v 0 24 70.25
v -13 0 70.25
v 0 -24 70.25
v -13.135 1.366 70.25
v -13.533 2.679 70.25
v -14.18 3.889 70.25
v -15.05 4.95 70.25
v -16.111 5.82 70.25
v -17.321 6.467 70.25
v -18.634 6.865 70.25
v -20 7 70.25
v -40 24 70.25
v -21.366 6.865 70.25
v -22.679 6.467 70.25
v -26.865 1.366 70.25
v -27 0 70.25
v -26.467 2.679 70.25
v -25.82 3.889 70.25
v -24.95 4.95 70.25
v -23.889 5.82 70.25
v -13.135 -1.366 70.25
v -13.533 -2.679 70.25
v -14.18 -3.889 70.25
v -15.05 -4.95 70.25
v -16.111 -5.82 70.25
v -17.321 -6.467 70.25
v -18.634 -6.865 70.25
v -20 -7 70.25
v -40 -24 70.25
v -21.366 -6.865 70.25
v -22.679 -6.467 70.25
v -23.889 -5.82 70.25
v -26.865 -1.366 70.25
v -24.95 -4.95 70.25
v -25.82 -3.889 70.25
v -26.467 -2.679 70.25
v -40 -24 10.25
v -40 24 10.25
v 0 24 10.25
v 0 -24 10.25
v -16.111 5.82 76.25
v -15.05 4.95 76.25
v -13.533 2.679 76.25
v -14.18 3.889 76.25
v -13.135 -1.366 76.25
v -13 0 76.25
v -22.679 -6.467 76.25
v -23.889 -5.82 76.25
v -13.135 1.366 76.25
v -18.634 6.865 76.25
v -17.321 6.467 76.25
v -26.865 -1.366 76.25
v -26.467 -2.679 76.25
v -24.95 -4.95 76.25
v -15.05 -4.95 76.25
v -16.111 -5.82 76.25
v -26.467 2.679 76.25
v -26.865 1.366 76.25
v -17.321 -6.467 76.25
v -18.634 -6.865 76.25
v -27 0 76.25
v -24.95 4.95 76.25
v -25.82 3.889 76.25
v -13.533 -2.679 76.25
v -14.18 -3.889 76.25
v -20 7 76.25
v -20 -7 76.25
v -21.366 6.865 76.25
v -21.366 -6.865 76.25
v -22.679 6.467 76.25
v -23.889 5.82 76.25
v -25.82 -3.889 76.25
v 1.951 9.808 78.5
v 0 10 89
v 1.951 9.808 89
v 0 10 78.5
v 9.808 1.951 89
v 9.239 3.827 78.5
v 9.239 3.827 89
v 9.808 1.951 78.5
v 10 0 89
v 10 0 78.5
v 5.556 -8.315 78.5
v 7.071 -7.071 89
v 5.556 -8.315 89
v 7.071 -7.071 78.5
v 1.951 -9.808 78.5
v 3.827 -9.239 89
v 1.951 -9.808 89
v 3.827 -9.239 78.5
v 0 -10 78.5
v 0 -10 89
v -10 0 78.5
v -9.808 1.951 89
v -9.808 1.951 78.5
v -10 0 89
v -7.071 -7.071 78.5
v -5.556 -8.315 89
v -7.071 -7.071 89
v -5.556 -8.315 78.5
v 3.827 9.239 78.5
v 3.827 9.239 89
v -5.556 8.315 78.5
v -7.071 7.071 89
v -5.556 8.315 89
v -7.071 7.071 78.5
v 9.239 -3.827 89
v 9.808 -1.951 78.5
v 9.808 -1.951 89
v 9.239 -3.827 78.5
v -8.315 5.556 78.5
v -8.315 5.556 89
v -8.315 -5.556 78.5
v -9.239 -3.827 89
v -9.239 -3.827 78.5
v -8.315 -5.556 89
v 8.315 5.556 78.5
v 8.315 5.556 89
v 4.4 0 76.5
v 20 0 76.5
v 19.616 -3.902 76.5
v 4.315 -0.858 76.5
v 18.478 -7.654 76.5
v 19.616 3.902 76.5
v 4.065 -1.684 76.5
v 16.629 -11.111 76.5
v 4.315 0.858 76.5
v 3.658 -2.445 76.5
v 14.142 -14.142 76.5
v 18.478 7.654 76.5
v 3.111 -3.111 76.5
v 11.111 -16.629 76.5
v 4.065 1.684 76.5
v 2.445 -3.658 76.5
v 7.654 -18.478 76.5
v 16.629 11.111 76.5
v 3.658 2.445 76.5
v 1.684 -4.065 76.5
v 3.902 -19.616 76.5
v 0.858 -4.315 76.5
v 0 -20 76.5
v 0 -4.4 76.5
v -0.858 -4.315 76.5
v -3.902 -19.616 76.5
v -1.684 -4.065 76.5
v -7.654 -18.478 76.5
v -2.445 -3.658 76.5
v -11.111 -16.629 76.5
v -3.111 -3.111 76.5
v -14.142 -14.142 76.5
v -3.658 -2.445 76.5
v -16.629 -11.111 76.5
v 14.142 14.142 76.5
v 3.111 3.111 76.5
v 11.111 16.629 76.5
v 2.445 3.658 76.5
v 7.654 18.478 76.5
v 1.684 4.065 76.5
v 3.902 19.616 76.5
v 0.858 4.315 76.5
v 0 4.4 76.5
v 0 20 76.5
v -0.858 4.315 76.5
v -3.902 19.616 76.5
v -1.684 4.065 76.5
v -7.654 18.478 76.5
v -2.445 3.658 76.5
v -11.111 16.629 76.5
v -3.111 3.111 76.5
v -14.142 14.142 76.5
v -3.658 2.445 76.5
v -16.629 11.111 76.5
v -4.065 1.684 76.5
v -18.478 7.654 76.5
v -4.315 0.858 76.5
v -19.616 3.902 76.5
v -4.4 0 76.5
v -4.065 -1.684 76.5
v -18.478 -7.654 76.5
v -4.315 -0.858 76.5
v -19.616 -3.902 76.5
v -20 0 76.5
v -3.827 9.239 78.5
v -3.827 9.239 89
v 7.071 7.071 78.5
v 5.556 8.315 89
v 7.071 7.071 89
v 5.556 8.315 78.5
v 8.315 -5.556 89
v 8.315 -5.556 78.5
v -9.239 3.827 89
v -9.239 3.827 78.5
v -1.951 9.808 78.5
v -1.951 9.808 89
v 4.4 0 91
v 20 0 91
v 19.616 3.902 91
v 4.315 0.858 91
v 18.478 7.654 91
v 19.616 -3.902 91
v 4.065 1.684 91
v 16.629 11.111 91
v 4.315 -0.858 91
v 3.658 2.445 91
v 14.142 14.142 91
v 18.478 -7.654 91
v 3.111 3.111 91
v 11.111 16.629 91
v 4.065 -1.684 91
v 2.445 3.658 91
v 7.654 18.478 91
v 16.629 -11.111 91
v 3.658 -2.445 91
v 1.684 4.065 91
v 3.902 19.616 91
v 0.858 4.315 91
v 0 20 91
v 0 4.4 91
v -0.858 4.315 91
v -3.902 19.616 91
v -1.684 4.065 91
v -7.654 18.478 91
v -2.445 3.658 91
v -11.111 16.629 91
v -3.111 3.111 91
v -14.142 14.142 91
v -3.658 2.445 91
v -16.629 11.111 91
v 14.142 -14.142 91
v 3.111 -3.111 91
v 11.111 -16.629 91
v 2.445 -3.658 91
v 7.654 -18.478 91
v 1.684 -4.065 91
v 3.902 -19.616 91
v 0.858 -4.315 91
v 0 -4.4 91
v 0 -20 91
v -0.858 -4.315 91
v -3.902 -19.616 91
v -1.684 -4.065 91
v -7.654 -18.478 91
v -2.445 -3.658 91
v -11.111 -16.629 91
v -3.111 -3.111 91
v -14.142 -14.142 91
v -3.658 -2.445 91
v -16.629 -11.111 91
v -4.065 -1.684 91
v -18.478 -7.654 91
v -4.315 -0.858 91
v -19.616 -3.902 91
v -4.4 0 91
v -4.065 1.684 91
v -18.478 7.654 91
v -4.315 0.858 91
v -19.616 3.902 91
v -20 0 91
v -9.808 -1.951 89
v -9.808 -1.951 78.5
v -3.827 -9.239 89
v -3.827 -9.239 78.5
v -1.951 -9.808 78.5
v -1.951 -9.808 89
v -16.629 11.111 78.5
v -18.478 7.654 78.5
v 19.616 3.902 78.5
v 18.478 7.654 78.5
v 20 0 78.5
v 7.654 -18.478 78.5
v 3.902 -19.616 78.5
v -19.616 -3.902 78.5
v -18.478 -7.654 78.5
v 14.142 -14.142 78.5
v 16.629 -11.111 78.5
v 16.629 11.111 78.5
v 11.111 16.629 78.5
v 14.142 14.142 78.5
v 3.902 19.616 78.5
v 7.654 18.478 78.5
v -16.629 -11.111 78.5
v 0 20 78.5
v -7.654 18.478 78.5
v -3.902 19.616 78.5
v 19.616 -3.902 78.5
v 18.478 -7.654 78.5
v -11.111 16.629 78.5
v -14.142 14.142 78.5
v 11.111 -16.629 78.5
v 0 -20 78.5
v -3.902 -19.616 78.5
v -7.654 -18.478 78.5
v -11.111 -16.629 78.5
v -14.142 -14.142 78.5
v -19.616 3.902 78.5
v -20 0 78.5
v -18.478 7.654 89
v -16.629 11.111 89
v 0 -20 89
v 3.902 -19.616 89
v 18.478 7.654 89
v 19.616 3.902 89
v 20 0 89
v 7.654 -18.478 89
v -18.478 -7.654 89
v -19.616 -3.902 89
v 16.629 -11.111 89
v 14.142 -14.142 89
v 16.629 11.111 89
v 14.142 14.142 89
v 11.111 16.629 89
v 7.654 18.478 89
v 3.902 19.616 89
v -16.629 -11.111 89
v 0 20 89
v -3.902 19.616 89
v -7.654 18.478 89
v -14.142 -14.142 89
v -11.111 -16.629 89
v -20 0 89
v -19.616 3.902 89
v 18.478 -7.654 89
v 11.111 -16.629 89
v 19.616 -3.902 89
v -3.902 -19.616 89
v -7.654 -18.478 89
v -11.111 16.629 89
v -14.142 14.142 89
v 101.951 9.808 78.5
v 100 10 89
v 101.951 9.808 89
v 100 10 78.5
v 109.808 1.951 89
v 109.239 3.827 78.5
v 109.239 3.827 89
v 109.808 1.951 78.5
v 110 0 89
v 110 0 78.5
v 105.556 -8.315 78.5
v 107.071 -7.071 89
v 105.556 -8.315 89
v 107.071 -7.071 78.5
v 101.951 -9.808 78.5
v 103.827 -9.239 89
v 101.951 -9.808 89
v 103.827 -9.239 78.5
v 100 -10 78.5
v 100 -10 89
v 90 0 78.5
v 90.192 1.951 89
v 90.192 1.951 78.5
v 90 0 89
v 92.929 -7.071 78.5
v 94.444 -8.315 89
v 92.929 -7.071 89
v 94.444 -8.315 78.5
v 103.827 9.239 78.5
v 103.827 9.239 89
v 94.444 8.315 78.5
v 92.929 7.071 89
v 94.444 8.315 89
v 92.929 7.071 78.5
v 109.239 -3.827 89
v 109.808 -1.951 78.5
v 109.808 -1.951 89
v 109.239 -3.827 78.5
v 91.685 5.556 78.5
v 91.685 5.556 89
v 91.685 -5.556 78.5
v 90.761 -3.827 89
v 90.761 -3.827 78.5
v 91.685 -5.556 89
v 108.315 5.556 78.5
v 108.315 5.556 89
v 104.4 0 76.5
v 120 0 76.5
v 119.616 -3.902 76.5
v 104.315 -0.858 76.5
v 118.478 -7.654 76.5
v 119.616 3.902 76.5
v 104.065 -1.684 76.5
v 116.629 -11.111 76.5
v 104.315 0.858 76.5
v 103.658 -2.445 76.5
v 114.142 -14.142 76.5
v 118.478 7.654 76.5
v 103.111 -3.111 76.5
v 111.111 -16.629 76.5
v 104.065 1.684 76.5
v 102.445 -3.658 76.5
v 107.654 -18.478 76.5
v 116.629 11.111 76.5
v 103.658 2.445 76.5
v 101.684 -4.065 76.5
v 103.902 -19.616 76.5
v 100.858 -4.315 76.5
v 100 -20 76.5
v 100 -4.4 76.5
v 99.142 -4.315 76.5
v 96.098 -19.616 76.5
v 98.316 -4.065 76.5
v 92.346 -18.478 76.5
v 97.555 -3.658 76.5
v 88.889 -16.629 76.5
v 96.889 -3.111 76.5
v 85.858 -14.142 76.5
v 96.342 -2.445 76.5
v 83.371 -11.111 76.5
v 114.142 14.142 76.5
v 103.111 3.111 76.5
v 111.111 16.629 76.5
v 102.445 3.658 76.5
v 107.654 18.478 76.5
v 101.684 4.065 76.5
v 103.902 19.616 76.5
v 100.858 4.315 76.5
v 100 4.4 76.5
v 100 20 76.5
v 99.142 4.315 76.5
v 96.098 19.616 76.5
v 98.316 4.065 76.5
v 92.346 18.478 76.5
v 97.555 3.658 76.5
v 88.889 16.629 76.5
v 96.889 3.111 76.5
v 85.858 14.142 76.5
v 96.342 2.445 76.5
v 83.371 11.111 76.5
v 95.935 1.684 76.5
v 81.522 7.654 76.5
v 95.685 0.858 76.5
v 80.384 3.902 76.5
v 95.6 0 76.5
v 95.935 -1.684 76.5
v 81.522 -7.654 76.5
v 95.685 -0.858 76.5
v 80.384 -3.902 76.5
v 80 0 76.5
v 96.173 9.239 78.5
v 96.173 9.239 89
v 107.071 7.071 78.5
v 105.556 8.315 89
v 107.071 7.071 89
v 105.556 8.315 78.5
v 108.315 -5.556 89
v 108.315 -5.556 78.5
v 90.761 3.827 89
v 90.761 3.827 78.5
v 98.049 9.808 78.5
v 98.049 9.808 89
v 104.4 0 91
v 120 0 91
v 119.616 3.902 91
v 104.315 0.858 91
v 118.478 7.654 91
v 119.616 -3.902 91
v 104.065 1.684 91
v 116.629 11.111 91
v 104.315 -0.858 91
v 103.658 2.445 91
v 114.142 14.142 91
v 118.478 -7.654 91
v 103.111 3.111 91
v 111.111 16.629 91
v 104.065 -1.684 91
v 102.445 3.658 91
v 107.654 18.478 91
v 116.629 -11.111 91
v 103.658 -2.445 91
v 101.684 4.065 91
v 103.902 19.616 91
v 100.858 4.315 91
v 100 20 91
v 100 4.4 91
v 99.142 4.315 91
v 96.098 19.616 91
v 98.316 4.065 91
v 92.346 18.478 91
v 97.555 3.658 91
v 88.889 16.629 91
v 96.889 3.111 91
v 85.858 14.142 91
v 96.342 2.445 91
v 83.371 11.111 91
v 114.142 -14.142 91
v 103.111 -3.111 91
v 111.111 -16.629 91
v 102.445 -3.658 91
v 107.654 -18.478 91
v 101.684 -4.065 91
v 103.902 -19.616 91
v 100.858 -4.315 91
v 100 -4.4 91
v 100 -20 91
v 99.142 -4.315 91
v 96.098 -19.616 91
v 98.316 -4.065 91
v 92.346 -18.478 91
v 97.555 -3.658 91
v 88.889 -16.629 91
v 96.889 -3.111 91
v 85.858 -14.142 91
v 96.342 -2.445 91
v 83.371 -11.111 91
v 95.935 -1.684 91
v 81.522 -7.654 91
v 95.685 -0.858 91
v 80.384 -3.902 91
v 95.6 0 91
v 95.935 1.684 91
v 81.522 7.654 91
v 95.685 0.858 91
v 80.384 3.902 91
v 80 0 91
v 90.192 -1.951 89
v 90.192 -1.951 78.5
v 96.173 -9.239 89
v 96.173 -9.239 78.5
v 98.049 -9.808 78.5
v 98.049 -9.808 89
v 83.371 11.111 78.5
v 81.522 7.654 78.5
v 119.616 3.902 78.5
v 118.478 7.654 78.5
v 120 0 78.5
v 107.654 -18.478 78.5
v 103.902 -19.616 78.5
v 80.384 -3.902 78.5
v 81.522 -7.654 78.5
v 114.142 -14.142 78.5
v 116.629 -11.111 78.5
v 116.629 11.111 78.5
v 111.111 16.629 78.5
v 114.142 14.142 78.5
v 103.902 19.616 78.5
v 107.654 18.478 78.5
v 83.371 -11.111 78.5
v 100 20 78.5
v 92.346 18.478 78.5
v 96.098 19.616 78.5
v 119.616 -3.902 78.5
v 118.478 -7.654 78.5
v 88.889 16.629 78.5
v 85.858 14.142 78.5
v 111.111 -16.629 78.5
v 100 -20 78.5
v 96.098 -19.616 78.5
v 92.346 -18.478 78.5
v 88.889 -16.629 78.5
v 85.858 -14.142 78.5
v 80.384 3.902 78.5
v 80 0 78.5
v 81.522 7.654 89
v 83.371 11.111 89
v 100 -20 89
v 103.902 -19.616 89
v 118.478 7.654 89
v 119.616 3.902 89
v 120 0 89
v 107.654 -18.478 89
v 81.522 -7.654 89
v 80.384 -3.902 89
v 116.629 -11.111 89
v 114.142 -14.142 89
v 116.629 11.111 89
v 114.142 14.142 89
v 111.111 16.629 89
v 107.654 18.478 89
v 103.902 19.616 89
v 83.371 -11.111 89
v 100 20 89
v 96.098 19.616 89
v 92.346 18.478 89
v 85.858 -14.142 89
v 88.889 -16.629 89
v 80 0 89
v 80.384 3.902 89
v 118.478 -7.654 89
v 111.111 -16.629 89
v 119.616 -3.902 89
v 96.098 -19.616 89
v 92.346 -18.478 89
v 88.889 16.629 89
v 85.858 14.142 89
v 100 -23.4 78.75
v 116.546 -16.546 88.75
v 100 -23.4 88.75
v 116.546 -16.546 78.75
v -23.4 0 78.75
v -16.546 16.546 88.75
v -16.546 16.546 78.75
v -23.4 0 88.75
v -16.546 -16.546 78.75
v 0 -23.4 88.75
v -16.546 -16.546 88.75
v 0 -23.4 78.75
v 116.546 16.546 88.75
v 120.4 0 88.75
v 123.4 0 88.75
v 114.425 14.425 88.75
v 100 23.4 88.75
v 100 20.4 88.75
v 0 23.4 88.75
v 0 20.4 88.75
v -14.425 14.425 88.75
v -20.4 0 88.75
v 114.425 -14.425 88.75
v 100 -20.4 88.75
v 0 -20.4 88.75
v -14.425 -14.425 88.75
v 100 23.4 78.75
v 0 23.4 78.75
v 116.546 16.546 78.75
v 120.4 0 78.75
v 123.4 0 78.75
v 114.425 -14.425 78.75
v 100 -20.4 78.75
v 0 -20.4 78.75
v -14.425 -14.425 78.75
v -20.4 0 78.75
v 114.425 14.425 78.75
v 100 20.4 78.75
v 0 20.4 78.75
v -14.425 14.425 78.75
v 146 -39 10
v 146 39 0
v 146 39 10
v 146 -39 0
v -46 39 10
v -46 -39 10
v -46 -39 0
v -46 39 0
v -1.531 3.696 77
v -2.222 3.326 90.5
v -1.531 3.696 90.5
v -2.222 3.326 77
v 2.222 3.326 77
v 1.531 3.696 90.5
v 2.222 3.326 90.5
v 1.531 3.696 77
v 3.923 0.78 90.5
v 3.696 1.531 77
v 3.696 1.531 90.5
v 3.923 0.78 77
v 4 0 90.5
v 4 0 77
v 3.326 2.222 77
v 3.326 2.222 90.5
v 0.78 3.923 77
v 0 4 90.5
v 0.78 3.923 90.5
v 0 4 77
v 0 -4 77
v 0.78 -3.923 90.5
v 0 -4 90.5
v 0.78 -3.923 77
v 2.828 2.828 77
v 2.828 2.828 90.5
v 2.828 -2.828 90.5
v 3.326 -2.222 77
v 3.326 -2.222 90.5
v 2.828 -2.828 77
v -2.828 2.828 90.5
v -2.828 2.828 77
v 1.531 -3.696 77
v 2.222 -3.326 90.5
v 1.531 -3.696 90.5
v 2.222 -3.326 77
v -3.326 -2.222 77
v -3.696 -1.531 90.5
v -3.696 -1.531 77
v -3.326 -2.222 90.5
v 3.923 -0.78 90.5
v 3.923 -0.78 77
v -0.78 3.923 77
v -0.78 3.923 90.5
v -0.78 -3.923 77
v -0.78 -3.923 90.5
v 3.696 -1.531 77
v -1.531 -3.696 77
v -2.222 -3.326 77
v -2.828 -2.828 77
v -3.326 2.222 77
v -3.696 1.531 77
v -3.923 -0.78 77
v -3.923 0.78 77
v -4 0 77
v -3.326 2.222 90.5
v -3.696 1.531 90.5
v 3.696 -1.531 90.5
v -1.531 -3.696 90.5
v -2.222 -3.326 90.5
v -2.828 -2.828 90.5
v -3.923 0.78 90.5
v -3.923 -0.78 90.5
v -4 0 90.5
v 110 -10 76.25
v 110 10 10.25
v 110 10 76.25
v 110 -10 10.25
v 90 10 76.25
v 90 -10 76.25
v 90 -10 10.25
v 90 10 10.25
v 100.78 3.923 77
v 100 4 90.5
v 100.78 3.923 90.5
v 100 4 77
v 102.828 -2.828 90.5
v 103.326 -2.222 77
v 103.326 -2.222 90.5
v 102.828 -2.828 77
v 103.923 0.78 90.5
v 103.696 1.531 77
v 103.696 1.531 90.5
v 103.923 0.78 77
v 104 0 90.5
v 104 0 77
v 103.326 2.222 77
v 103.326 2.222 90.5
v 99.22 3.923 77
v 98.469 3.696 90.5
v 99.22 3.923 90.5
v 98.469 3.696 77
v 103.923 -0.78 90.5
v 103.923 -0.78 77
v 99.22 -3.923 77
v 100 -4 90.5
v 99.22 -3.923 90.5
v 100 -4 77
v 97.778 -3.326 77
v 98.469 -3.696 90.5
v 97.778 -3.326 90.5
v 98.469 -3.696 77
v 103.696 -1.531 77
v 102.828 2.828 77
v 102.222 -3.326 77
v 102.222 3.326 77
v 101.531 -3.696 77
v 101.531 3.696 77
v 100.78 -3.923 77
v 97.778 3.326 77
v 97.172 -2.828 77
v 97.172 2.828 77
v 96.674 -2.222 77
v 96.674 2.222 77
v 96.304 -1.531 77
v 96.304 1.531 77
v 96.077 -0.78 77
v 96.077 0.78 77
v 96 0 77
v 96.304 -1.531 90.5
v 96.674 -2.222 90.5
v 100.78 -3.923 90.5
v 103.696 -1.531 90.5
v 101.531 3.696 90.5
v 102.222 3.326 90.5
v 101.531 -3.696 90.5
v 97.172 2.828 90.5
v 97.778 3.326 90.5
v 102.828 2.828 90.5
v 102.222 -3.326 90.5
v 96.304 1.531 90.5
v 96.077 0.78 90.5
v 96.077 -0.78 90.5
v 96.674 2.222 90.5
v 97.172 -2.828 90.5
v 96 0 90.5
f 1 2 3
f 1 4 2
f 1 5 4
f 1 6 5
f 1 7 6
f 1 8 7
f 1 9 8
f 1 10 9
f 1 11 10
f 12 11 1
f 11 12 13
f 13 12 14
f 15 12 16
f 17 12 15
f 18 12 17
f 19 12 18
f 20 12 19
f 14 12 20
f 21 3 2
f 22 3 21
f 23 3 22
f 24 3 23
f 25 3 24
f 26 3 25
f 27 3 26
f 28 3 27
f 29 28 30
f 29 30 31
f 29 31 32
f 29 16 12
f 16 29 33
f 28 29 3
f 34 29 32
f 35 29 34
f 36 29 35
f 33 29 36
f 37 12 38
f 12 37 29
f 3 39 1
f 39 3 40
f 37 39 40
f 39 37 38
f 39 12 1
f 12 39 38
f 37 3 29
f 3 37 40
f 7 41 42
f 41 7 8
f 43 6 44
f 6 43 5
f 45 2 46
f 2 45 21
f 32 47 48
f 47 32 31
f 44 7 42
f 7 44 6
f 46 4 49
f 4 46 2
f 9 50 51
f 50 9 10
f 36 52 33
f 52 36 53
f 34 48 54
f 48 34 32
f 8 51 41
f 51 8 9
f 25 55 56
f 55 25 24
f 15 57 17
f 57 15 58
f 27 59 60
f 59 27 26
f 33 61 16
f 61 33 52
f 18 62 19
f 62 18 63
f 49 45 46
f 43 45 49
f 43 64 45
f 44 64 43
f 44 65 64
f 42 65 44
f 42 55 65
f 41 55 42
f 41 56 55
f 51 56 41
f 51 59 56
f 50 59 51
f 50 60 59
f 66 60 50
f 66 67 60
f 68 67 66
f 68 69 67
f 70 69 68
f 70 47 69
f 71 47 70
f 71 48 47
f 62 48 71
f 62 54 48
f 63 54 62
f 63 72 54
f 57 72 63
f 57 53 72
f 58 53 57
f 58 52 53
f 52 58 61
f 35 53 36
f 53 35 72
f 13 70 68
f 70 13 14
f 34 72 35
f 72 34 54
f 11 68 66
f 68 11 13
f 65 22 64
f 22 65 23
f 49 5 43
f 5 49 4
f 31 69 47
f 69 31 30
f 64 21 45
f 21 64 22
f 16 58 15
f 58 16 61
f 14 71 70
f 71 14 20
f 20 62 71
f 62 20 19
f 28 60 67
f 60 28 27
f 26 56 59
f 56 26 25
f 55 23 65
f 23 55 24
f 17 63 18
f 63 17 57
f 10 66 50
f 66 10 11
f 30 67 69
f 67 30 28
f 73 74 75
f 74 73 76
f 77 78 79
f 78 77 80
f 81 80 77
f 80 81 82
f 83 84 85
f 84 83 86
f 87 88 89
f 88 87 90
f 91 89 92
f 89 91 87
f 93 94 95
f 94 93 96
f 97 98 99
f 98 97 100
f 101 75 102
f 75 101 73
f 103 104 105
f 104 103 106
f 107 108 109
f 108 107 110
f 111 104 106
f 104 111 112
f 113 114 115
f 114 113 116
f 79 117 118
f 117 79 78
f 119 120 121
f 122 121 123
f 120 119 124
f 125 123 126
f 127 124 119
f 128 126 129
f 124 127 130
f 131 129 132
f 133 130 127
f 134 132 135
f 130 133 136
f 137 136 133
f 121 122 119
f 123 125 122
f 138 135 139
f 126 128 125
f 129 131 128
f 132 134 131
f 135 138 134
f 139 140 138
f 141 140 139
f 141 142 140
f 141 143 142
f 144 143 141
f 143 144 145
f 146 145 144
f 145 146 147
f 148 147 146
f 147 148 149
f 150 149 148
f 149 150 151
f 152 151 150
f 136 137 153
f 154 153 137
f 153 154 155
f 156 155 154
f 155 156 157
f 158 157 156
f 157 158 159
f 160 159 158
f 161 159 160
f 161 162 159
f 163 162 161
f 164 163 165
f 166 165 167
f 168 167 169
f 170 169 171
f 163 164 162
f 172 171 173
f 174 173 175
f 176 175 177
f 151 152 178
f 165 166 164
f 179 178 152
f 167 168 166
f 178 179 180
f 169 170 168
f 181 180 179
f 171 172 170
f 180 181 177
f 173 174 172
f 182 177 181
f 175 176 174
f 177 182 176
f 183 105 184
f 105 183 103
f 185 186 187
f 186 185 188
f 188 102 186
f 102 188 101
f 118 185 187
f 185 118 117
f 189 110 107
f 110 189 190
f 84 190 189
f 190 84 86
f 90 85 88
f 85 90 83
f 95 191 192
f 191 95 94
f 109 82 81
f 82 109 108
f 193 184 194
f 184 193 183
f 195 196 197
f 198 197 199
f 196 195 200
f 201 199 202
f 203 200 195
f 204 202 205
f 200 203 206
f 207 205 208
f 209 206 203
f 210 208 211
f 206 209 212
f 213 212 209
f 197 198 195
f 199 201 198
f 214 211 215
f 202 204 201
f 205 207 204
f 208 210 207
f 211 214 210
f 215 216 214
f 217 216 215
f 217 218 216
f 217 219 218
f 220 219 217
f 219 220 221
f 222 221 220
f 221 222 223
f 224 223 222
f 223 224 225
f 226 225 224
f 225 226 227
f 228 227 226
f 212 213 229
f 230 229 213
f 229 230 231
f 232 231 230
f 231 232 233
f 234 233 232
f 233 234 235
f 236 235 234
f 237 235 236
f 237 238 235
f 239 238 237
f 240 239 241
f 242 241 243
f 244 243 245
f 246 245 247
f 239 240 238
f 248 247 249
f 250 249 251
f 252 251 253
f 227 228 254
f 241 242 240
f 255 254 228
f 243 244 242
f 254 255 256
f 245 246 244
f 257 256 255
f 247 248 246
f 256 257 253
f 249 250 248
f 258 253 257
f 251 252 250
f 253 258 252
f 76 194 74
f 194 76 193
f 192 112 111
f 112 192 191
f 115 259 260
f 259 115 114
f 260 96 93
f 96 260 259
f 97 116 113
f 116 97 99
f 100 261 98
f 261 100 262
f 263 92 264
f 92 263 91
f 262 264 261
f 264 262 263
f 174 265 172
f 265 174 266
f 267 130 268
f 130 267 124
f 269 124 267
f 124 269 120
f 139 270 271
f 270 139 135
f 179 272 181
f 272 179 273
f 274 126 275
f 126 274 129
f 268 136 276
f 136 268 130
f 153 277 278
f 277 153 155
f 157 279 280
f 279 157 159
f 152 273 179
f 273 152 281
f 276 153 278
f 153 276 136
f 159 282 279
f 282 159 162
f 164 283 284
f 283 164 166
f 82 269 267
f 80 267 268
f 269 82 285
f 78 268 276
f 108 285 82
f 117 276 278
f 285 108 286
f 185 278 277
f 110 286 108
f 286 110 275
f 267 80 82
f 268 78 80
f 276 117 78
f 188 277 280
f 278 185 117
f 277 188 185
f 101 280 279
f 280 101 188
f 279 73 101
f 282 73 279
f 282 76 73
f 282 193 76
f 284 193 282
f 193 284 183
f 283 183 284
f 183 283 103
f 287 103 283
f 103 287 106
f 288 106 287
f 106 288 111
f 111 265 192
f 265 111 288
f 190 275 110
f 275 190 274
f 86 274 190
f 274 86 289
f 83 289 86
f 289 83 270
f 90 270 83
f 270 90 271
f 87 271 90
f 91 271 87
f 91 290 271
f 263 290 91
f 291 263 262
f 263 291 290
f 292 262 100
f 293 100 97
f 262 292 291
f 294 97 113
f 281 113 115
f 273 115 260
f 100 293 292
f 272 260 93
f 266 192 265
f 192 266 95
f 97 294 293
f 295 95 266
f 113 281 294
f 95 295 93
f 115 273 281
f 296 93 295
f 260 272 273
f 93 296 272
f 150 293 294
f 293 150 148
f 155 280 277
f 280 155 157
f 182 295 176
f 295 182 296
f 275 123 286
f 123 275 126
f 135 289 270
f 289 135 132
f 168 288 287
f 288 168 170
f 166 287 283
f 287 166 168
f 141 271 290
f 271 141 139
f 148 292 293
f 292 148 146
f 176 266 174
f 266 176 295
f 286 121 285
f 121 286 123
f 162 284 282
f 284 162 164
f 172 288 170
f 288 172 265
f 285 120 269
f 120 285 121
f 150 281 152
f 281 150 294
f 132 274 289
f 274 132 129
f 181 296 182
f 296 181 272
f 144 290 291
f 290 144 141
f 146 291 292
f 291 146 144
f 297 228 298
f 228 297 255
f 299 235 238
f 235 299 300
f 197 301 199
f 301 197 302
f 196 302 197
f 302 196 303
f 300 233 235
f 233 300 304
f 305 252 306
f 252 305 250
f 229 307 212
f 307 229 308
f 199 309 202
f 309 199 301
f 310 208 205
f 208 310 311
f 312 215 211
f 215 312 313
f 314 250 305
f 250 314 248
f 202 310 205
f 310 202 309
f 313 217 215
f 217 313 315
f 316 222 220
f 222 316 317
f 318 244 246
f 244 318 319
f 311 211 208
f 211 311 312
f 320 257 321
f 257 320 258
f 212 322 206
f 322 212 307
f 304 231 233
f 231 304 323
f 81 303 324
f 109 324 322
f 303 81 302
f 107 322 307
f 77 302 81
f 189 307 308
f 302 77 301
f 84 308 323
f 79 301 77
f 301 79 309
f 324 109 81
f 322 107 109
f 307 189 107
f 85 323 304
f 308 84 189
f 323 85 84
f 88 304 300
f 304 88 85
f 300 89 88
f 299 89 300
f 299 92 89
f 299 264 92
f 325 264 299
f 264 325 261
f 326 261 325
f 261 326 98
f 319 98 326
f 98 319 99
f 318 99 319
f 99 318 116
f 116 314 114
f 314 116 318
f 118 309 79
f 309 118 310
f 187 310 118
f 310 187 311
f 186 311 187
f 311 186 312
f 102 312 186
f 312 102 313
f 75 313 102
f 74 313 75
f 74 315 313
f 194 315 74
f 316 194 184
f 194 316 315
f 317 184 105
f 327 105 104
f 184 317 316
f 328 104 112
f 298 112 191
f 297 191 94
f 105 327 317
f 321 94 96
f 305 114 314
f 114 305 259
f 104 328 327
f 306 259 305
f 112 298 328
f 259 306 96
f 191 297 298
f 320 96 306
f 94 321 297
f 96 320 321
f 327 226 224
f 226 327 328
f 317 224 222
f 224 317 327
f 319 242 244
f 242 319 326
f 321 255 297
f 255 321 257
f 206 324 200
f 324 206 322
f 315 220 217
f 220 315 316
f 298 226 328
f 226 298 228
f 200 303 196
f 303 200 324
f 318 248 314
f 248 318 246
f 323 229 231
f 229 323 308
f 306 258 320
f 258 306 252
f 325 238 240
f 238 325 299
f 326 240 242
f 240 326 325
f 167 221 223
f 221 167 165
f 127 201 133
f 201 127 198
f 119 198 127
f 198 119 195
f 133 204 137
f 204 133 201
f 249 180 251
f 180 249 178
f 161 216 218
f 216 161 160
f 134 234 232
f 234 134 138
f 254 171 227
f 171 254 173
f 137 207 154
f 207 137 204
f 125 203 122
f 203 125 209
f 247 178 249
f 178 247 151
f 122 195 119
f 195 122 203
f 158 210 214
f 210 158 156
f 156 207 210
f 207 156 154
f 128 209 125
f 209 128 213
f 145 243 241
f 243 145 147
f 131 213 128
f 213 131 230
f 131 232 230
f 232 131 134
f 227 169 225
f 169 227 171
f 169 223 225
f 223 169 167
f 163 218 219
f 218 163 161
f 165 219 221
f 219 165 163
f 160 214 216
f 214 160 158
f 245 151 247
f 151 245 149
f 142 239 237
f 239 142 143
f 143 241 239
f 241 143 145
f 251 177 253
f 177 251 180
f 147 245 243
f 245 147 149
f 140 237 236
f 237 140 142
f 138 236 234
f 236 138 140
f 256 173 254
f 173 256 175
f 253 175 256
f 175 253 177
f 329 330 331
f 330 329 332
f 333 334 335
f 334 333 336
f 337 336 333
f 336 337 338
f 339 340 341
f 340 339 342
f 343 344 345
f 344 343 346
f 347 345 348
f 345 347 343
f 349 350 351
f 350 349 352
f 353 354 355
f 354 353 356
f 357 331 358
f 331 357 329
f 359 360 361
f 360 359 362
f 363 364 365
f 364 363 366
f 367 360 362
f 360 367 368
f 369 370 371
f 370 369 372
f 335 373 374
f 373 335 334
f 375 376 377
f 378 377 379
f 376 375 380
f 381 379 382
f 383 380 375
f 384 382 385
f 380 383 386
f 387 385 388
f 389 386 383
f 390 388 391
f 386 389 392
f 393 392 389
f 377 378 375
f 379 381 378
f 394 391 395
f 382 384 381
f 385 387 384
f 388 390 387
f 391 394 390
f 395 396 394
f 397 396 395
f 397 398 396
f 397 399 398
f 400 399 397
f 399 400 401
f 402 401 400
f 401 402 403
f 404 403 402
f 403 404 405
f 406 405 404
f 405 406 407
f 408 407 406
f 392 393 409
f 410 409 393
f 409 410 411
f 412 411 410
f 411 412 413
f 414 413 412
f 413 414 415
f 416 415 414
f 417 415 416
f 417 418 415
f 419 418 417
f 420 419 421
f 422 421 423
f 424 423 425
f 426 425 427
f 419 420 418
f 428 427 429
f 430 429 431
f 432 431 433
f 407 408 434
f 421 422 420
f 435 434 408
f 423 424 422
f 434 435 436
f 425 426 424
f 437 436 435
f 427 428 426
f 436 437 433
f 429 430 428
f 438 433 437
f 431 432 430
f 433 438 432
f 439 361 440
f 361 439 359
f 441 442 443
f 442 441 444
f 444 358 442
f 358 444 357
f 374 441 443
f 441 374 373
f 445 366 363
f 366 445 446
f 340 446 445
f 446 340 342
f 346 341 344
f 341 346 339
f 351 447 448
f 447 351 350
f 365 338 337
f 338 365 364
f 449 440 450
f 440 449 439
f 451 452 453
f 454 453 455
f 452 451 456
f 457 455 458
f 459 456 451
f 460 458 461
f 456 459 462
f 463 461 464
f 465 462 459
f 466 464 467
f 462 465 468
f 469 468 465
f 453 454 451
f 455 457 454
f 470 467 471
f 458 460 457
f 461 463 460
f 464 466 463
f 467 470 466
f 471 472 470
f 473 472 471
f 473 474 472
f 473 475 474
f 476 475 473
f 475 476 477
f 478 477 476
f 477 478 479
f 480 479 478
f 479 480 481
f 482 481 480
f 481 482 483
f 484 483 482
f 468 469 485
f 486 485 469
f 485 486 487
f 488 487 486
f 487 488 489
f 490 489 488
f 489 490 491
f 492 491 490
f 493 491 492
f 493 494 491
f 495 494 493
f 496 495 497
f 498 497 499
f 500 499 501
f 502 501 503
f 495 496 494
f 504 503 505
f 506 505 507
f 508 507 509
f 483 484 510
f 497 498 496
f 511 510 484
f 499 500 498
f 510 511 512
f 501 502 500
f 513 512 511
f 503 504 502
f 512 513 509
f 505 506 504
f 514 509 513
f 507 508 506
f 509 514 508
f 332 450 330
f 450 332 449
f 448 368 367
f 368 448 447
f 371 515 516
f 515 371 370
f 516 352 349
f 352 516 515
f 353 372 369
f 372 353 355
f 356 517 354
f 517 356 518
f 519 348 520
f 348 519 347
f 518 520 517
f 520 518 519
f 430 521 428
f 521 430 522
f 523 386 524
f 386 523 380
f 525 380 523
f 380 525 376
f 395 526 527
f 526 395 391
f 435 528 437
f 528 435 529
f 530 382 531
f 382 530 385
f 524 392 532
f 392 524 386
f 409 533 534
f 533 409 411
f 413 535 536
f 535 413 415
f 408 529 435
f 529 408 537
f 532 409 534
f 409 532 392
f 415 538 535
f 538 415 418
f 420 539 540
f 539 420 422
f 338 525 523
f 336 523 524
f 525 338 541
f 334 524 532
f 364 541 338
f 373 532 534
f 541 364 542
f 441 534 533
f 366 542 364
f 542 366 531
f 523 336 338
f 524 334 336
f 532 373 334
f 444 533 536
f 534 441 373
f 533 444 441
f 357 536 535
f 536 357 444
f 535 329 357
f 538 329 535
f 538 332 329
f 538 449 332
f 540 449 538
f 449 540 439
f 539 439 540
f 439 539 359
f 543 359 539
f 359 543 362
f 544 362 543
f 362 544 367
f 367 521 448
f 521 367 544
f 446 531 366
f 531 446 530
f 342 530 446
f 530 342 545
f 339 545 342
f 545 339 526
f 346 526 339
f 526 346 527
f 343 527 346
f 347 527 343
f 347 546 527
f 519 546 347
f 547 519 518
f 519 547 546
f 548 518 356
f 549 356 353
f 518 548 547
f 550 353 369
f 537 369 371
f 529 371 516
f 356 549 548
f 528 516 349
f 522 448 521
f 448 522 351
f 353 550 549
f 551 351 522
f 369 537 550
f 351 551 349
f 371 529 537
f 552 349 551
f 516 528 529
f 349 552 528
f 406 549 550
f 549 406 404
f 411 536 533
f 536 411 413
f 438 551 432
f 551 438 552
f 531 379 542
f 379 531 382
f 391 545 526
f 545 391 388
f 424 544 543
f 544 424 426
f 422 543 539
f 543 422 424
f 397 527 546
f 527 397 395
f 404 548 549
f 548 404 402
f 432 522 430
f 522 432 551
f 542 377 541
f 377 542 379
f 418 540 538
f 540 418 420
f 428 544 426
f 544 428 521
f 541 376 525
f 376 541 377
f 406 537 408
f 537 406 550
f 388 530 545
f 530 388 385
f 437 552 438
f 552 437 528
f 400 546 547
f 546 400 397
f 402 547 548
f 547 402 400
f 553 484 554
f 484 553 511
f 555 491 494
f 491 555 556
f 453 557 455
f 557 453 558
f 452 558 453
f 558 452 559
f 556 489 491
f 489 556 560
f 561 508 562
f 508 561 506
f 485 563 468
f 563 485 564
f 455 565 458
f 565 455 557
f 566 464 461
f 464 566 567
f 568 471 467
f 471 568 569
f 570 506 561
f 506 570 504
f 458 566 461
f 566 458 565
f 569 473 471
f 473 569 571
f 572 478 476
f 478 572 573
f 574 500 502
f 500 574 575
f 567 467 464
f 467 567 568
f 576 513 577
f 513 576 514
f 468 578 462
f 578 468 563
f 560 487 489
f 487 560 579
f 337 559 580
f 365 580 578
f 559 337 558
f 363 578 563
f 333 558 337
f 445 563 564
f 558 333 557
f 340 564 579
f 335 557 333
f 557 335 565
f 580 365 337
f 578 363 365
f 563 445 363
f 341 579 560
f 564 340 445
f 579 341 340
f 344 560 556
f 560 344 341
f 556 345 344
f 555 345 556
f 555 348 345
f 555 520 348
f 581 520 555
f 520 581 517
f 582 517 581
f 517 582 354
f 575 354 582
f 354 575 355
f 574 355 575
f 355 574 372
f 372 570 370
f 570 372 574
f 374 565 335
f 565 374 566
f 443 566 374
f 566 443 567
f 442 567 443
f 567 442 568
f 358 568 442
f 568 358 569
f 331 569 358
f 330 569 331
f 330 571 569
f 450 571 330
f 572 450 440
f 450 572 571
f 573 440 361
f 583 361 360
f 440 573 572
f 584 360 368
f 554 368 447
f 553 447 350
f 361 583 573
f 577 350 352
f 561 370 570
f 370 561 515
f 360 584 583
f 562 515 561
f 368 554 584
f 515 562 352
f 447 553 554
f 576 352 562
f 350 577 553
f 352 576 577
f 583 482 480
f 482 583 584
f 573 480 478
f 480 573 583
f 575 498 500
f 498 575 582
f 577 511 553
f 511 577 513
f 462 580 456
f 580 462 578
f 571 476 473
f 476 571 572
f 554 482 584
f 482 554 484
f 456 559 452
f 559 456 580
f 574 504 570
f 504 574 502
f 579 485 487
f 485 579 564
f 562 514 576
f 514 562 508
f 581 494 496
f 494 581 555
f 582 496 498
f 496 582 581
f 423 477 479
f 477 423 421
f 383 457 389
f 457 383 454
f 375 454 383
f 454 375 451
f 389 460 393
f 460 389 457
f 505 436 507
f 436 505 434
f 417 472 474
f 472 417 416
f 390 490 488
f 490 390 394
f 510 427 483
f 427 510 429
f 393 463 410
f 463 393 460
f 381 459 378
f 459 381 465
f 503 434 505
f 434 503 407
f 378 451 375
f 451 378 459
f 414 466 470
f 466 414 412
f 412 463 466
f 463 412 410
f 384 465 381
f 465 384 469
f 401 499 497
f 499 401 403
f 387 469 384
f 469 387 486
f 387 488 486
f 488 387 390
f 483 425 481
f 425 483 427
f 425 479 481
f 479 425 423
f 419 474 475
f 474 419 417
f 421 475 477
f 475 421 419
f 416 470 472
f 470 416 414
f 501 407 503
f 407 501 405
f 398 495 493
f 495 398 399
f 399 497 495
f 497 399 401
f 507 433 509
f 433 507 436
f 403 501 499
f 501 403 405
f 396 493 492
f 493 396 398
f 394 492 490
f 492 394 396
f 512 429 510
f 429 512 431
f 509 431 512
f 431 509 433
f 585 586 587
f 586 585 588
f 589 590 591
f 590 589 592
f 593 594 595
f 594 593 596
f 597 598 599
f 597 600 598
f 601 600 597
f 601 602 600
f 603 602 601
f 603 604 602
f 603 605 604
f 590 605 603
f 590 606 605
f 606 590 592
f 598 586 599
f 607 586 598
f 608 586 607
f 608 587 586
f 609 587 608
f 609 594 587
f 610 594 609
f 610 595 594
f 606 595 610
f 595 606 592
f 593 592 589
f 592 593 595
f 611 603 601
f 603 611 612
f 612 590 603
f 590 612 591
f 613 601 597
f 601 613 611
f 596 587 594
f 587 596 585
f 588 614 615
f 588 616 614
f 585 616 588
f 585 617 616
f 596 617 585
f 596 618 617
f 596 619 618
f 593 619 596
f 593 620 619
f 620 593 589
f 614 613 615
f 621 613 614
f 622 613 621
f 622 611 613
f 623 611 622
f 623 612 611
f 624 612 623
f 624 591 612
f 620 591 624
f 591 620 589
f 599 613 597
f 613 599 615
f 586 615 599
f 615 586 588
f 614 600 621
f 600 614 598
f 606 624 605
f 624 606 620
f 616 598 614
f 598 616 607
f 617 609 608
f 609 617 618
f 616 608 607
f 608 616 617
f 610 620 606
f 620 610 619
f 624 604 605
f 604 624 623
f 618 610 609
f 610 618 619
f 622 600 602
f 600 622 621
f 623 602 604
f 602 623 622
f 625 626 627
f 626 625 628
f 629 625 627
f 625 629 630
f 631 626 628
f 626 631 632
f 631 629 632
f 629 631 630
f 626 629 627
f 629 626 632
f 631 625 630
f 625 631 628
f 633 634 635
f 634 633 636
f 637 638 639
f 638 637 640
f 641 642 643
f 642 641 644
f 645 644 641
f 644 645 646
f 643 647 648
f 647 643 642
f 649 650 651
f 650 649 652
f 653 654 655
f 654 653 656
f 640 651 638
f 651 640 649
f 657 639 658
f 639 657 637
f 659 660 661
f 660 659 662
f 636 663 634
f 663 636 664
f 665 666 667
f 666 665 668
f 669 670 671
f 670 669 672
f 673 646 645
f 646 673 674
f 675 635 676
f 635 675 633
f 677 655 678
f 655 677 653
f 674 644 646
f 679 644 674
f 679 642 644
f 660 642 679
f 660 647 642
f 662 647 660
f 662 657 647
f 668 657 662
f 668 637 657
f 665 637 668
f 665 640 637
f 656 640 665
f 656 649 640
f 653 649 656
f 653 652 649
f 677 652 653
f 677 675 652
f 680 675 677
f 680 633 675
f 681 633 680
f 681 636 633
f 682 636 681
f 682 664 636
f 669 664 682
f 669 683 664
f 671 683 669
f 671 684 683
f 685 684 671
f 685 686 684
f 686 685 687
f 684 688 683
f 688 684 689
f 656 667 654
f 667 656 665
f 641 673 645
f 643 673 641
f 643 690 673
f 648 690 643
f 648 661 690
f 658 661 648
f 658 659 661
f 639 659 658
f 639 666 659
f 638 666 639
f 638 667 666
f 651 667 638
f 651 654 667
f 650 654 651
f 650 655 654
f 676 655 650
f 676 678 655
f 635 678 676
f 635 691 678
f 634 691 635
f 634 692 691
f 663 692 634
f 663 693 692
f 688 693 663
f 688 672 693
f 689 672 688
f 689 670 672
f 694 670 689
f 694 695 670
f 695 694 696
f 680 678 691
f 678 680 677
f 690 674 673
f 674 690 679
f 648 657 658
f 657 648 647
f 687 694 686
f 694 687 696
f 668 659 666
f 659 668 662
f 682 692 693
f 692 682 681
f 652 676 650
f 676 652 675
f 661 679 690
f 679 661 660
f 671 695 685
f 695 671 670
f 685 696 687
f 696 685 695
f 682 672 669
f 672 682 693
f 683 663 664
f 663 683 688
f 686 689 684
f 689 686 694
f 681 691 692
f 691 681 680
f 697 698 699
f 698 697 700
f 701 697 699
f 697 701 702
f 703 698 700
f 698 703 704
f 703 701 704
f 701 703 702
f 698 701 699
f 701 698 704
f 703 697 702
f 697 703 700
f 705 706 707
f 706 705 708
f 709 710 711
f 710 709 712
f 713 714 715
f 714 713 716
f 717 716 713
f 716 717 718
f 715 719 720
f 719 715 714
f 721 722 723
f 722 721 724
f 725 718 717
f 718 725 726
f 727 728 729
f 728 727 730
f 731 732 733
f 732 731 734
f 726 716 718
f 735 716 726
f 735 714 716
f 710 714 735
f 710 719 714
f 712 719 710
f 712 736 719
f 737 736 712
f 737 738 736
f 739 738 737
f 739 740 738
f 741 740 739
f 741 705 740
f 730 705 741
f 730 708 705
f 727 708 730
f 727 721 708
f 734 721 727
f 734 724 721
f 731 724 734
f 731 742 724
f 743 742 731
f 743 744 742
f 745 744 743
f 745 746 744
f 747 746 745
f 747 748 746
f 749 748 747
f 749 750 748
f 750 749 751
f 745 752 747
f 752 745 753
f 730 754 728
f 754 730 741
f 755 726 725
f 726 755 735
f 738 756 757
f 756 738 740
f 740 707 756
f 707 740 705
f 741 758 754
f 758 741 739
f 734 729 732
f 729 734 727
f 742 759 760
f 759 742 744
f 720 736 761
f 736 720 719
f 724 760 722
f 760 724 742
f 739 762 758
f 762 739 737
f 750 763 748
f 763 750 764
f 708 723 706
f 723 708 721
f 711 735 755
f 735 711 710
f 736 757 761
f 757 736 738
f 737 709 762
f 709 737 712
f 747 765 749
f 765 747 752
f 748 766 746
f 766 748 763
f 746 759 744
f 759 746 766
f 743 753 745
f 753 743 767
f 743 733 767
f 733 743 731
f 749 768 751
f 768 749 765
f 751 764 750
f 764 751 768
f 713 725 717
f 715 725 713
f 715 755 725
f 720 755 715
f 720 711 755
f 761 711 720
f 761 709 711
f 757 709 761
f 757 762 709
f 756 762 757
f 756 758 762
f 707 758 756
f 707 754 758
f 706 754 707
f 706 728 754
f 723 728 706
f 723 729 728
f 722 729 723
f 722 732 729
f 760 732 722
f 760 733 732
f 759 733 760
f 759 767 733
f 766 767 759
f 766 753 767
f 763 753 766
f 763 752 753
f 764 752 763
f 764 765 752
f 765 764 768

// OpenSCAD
$fn = 32;

// ------------------------------------------------------------------------
// Motor belt drive: span 100 mm, pulleys d40, belt 10 mm wide
// Every part is its own module, assembly() places every instance.
// ------------------------------------------------------------------------

// --- part 1 ---
module base_plate() {
  difference() {
    translate([-96, -39, 0]) cube([192, 78, 10]);
  }
}

// --- part 2 ---
module motor() {
  union() {
    translate([-30, -24, 0]) cube([60, 48, 40]);
    translate([33, 0, 20]) rotate([0, 90, 0]) cylinder(h = 6, d = 14, center = true);
  }
}

// --- part 3 ---
module drive_shaft() {
  translate([0, 0, -6.75]) cylinder(h = 13.5, d = 8);
}

// --- part 4 ---
module pulley_drive() {
  difference() {
    union() {
      cylinder(h = 14.5, d = 20);
      cylinder(h = 2, d = 40);
      translate([0, 0, 12.5]) cylinder(h = 2, d = 40);
    }
    translate([0, 0, -1]) cylinder(h = 16.5, d = 8.8);
  }
}

// --- part 5 ---
module idler_post() {
  translate([-10, -10, 0]) cube([20, 20, 66]);
}

// --- part 6 ---
module driven_shaft() {
  translate([0, 0, -6.75]) cylinder(h = 13.5, d = 8);
}

// --- part 7 ---
module pulley_driven() {
  difference() {
    union() {
      cylinder(h = 14.5, d = 20);
      cylinder(h = 2, d = 40);
      translate([0, 0, 12.5]) cylinder(h = 2, d = 40);
    }
    translate([0, 0, -1]) cylinder(h = 16.5, d = 8.8);
  }
}

// --- part 8 ---
module drive_belt() {
  difference() {
    linear_extrude(height = 10) polygon(points = concat([for (a = [90 : 45 : 270]) [23.4 * cos(a), 23.4 * sin(a)]], [for (a = [270 : 45 : 450]) [100 + 23.4 * cos(a), 23.4 * sin(a)]]));
    translate([0, 0, -1]) linear_extrude(height = 12) polygon(points = concat([for (a = [90 : 45 : 270]) [20.4 * cos(a), 20.4 * sin(a)]], [for (a = [270 : 45 : 450]) [100 + 20.4 * cos(a), 20.4 * sin(a)]]));
  }
}

// --- assembly ---
module assembly() {
  color([0.80, 0.24, 0.20]) translate([50, 0, 0]) rotate([0, 0, 0]) base_plate();
  color([0.20, 0.45, 0.75]) translate([0, 0, 40.25]) rotate([0, 270, 0]) motor();
  color([0.25, 0.62, 0.32]) translate([0, 0, 83.75]) rotate([0, 0, 0]) drive_shaft();
  color([0.92, 0.70, 0.18]) translate([0, 0, 76.5]) rotate([0, 0, 0]) pulley_drive();
  color([0.58, 0.35, 0.70]) translate([100, 0, 10.25]) rotate([0, 0, 0]) idler_post();
  color([0.16, 0.66, 0.66]) translate([100, 0, 83.75]) rotate([0, 0, 0]) driven_shaft();
  color([0.85, 0.48, 0.18]) translate([100, 0, 76.5]) rotate([0, 0, 0]) pulley_driven();
  color([0.55, 0.60, 0.65]) translate([0, 0, 78.75]) rotate([0, 0, 0]) drive_belt();
}

assembly();
